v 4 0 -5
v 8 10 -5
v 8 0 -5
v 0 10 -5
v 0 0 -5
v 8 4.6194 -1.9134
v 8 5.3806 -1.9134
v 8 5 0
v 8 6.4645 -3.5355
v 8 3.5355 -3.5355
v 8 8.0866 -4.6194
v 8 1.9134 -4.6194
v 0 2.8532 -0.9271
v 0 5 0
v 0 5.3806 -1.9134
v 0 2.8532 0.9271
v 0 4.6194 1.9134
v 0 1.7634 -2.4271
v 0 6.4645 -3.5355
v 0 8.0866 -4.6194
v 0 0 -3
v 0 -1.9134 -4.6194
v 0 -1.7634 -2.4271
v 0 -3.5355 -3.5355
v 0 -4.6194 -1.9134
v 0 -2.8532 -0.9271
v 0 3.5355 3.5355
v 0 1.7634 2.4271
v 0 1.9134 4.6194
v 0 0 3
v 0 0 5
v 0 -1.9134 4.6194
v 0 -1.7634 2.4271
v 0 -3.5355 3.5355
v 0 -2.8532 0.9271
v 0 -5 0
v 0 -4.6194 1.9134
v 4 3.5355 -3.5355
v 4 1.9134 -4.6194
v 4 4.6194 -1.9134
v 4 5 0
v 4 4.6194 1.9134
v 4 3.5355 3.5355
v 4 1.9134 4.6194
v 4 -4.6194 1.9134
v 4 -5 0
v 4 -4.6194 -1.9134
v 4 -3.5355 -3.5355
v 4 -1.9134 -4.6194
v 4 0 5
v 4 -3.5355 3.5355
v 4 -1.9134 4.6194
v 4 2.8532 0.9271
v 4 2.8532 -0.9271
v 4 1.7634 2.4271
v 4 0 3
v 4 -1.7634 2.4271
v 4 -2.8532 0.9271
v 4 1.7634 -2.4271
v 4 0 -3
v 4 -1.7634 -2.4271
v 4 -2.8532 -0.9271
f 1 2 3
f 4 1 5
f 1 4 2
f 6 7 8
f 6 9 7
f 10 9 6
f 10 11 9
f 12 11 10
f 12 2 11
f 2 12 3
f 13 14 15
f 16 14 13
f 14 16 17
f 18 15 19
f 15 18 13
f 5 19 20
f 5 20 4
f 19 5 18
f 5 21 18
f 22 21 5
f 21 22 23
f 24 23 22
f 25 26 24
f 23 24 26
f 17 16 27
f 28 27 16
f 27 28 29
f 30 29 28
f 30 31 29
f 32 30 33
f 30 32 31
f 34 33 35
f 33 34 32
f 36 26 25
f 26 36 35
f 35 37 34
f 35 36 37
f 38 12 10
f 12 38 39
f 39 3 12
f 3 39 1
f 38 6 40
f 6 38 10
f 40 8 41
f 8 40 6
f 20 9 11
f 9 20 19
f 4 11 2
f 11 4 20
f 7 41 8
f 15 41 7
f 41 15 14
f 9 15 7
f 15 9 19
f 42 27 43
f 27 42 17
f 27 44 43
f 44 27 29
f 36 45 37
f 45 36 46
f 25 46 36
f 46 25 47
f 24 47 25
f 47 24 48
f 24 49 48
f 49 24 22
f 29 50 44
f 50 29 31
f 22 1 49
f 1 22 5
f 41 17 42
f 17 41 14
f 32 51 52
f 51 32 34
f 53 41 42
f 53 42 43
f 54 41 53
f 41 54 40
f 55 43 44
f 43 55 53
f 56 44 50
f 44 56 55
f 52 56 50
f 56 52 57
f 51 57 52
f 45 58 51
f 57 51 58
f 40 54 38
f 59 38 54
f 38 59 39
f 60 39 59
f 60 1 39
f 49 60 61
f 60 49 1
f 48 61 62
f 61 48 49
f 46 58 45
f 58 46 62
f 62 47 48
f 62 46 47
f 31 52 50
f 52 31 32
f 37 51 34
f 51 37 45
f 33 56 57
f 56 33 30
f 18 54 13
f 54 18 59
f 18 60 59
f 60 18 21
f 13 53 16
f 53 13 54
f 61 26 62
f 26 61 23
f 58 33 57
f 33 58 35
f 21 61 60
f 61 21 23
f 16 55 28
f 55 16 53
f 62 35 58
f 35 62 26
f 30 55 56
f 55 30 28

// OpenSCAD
module arm_holder(external_radius, internal_radius, width, tolerence)
{
    union()
    {
        scale(v = [1, 1, 2]) union() {
            difference() {
                cube(size = [external_radius, external_radius, width]);
                translate(v = [0, 0, width/2]) cylinder(h = width*2, r = external_radius, center = true);
            }
            translate(v = [0, external_radius*2, 0]) mirror(v = [0, 1, 0])  difference() {
                cube(size = [external_radius, external_radius, width]);
                translate(v = [0, 0, width/2]) cylinder(h = width*2, r = external_radius, center = true);
            }
        }

        difference()
        {
            translate(v = [0, 0, width/2]) cylinder(h = width, r = external_radius, center = true);
            cylinder(h = 13, r = internal_radius, center = true);
        }
    }
}


rotate(a = 90, v = [0, 1, 0]) arm_holder(5, 3, 4, .1);
